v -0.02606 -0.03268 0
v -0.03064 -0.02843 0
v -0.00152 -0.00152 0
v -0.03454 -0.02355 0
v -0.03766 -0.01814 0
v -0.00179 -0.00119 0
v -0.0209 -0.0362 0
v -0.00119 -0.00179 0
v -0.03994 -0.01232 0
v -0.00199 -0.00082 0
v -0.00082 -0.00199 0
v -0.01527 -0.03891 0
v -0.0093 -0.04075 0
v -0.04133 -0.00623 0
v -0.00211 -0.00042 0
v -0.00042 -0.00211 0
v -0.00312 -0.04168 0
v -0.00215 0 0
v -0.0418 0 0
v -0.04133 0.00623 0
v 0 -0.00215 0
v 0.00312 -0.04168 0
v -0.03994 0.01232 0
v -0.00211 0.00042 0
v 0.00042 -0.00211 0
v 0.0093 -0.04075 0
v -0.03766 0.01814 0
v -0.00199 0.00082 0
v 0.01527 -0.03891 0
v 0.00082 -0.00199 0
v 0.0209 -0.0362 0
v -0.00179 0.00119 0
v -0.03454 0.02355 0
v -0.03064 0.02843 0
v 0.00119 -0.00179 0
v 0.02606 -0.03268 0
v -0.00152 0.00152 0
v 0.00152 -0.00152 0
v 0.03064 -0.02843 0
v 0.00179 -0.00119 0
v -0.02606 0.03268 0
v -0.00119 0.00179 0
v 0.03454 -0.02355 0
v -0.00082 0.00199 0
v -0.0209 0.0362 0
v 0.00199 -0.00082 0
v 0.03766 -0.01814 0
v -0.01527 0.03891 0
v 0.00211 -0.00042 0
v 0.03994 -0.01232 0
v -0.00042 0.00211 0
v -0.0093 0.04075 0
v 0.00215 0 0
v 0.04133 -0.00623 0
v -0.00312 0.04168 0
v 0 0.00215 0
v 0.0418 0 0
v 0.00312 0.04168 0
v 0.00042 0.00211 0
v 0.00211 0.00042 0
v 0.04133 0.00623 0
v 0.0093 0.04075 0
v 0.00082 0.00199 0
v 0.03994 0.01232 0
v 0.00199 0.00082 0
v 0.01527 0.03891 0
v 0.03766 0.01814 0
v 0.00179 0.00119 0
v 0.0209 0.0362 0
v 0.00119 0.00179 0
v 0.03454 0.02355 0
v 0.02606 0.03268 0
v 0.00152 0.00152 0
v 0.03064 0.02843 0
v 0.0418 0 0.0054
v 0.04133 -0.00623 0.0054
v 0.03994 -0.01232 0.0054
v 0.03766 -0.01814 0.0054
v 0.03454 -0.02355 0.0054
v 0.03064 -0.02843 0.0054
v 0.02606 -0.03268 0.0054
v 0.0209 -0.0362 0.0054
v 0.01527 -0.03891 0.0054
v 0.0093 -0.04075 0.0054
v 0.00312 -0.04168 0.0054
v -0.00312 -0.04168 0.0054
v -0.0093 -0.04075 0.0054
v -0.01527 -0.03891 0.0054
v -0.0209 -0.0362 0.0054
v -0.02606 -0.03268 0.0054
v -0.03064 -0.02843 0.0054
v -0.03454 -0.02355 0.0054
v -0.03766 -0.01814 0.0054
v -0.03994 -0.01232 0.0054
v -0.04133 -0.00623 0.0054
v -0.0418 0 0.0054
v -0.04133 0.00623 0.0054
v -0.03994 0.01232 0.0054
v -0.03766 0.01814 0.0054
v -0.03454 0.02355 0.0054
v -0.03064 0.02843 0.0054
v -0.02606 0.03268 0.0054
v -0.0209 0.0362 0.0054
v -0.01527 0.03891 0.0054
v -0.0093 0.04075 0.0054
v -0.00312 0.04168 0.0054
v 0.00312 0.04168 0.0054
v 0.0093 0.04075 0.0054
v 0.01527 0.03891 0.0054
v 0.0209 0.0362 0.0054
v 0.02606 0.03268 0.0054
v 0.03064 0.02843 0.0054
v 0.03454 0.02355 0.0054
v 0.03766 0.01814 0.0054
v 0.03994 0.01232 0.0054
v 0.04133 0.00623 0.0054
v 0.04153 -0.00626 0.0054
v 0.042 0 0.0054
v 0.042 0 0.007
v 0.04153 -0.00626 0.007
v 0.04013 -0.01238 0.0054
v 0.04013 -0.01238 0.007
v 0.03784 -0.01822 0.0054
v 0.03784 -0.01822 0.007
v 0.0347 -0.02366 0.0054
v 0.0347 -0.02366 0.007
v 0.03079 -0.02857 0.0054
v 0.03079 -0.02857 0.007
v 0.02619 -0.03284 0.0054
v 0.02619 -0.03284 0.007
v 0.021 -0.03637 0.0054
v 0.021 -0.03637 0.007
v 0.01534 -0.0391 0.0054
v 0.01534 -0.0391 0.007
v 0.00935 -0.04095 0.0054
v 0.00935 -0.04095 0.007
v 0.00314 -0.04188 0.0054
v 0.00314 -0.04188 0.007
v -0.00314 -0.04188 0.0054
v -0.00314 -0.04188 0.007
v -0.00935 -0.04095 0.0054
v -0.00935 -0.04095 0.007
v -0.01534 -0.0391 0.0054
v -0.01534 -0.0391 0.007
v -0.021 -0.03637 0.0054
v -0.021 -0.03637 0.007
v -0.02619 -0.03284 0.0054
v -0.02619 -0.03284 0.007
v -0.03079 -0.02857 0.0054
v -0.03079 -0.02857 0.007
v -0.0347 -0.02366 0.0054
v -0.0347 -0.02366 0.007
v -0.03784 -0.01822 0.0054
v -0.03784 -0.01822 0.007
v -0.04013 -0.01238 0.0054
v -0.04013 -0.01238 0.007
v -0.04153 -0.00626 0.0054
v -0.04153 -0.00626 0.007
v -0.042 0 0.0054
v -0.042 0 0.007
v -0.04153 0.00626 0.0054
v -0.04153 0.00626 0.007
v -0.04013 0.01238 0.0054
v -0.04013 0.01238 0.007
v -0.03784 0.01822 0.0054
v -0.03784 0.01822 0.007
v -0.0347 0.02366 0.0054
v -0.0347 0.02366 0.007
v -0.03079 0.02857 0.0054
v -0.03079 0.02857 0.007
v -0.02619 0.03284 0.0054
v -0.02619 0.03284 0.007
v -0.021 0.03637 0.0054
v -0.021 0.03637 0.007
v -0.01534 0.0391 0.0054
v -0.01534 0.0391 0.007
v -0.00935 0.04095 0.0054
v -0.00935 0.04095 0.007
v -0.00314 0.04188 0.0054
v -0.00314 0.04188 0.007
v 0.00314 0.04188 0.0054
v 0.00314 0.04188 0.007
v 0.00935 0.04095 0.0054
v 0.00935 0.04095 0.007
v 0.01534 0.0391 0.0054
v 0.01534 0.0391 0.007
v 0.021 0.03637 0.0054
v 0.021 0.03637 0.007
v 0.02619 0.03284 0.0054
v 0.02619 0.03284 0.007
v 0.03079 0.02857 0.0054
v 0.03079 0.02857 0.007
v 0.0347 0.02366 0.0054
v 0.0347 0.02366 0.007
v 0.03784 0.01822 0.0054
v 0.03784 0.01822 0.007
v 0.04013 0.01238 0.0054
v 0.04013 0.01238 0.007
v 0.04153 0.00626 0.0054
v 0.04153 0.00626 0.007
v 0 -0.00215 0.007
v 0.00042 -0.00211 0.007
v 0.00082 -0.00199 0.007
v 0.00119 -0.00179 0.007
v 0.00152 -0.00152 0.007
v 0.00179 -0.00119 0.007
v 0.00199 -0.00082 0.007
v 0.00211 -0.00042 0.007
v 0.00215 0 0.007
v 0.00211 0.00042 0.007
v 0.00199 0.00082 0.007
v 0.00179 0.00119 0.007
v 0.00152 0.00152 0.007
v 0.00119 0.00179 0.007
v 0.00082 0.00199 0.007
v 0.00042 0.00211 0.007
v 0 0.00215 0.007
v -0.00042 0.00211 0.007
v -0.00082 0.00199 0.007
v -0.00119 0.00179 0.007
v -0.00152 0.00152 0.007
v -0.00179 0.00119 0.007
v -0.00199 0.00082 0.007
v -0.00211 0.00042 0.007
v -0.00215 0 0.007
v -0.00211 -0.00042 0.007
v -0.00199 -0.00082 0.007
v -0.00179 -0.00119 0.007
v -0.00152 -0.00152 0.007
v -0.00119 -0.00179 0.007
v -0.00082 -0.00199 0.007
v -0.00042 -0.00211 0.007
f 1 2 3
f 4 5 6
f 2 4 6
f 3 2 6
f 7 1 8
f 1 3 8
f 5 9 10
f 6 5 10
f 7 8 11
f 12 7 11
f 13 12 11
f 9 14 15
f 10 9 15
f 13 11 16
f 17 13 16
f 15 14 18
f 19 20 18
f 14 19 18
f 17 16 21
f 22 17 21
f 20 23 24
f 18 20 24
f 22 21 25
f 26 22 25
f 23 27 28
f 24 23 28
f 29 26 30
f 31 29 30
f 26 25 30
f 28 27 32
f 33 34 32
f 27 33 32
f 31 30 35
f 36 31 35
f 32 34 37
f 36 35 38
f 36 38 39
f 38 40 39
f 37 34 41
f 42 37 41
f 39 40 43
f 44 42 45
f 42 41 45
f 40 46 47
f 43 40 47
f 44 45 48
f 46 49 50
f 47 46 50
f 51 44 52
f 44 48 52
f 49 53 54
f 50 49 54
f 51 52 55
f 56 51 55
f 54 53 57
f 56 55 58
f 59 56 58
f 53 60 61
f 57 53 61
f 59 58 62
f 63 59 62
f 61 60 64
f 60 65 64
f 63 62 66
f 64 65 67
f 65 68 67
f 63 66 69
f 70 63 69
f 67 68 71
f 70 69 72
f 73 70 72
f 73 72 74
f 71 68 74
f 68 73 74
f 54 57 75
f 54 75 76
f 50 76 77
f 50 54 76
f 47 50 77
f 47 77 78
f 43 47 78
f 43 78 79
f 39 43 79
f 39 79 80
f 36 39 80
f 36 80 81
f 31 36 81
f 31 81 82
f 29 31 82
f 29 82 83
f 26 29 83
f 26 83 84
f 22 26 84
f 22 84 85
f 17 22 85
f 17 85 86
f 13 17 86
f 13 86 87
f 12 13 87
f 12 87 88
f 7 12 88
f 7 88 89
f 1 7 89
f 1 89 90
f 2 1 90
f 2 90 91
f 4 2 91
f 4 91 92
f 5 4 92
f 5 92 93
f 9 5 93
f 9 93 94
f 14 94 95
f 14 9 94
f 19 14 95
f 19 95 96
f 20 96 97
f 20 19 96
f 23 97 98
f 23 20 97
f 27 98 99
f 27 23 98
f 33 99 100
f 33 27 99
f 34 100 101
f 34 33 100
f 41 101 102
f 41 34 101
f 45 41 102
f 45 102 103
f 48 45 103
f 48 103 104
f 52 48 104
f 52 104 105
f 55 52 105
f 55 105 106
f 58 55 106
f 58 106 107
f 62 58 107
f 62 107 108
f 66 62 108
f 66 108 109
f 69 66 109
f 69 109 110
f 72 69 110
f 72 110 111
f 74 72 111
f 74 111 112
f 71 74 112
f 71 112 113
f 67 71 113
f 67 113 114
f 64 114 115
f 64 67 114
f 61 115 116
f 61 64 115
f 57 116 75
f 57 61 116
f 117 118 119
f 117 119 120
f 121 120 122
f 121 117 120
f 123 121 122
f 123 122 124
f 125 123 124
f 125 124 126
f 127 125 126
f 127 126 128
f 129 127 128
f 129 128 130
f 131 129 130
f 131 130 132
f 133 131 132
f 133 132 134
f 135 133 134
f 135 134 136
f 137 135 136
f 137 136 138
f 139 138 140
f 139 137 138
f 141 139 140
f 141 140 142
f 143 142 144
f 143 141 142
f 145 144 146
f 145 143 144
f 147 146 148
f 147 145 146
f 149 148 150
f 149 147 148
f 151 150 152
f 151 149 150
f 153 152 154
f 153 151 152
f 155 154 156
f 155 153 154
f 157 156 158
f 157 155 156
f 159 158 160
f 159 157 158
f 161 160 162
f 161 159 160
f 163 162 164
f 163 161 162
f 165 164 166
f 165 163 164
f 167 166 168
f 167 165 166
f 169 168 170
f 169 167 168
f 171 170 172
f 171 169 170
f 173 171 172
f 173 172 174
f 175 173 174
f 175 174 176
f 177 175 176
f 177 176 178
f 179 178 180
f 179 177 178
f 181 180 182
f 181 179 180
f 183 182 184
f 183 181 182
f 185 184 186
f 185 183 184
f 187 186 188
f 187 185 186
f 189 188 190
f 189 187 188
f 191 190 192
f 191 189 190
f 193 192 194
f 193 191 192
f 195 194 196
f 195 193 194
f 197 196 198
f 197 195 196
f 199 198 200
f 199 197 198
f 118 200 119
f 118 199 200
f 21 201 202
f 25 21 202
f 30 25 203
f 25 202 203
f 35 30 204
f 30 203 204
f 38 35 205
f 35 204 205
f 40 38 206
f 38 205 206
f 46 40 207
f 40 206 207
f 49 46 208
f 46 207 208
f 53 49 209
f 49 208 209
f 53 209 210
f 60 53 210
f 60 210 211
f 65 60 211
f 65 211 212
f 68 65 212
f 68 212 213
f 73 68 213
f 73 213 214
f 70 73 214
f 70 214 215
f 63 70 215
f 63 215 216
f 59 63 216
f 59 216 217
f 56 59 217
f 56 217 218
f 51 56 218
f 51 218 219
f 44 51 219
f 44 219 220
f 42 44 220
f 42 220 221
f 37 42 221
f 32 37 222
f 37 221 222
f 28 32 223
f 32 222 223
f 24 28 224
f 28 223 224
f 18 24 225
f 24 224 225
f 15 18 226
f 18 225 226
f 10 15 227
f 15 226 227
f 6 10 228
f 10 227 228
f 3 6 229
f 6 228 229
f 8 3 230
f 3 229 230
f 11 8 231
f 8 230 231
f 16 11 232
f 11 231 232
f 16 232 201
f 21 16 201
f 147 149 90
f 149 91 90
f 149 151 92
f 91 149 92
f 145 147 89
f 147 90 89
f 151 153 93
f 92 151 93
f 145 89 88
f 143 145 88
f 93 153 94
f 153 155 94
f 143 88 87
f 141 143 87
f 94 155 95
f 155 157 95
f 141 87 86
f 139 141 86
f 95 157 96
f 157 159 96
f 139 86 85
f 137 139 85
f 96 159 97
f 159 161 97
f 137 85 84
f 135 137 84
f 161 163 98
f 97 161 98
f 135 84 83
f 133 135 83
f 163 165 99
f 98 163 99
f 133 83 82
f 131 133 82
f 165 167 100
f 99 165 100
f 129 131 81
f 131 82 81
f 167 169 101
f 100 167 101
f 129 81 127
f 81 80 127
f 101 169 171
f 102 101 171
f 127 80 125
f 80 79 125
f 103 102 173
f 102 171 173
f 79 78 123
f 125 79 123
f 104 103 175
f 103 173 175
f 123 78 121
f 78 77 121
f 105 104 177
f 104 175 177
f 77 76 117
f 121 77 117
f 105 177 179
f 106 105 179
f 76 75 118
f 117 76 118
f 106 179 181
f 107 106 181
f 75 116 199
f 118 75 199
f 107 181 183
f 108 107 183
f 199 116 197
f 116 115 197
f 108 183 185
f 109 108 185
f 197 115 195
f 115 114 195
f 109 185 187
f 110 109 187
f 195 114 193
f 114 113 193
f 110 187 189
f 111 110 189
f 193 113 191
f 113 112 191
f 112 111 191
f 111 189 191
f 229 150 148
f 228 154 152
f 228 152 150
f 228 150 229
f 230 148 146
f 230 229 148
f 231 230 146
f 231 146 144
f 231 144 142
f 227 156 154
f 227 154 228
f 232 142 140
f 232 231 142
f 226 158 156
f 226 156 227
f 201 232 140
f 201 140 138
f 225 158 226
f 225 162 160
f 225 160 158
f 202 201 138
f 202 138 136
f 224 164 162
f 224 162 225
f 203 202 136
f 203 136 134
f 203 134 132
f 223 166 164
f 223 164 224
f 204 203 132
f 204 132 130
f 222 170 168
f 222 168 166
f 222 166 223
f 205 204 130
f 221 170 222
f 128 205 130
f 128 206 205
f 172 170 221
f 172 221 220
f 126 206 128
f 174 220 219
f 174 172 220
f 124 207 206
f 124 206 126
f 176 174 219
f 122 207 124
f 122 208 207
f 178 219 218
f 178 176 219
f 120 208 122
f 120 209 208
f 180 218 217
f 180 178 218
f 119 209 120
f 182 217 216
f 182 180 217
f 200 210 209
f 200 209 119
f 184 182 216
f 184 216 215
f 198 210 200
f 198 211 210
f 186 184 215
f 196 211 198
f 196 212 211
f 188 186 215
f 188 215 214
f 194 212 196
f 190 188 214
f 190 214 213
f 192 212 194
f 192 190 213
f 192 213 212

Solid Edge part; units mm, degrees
sketch "Sketch1" plane through (0, 0, 0) normal (0, 0, 1) x (1, 0, 0)
  circle A0 centre (0, 0) radius 0.0418
extrude "Protrusion1" add sketch "Sketch1" along normal blind 0.0054
sketch "Sketch2" plane through (0, 0, 0.0054) normal (0, 0, 1) x (1, 0, 0)
  circle A0 centre (0, 0) radius 0.042
extrude "Ausprägung_2" add sketch "Sketch2" along normal blind 0.0016
hole "Bohrung_1" at (0, 0, 0.007) direction (0, 0, -1) diameter 0.0043 end through all
